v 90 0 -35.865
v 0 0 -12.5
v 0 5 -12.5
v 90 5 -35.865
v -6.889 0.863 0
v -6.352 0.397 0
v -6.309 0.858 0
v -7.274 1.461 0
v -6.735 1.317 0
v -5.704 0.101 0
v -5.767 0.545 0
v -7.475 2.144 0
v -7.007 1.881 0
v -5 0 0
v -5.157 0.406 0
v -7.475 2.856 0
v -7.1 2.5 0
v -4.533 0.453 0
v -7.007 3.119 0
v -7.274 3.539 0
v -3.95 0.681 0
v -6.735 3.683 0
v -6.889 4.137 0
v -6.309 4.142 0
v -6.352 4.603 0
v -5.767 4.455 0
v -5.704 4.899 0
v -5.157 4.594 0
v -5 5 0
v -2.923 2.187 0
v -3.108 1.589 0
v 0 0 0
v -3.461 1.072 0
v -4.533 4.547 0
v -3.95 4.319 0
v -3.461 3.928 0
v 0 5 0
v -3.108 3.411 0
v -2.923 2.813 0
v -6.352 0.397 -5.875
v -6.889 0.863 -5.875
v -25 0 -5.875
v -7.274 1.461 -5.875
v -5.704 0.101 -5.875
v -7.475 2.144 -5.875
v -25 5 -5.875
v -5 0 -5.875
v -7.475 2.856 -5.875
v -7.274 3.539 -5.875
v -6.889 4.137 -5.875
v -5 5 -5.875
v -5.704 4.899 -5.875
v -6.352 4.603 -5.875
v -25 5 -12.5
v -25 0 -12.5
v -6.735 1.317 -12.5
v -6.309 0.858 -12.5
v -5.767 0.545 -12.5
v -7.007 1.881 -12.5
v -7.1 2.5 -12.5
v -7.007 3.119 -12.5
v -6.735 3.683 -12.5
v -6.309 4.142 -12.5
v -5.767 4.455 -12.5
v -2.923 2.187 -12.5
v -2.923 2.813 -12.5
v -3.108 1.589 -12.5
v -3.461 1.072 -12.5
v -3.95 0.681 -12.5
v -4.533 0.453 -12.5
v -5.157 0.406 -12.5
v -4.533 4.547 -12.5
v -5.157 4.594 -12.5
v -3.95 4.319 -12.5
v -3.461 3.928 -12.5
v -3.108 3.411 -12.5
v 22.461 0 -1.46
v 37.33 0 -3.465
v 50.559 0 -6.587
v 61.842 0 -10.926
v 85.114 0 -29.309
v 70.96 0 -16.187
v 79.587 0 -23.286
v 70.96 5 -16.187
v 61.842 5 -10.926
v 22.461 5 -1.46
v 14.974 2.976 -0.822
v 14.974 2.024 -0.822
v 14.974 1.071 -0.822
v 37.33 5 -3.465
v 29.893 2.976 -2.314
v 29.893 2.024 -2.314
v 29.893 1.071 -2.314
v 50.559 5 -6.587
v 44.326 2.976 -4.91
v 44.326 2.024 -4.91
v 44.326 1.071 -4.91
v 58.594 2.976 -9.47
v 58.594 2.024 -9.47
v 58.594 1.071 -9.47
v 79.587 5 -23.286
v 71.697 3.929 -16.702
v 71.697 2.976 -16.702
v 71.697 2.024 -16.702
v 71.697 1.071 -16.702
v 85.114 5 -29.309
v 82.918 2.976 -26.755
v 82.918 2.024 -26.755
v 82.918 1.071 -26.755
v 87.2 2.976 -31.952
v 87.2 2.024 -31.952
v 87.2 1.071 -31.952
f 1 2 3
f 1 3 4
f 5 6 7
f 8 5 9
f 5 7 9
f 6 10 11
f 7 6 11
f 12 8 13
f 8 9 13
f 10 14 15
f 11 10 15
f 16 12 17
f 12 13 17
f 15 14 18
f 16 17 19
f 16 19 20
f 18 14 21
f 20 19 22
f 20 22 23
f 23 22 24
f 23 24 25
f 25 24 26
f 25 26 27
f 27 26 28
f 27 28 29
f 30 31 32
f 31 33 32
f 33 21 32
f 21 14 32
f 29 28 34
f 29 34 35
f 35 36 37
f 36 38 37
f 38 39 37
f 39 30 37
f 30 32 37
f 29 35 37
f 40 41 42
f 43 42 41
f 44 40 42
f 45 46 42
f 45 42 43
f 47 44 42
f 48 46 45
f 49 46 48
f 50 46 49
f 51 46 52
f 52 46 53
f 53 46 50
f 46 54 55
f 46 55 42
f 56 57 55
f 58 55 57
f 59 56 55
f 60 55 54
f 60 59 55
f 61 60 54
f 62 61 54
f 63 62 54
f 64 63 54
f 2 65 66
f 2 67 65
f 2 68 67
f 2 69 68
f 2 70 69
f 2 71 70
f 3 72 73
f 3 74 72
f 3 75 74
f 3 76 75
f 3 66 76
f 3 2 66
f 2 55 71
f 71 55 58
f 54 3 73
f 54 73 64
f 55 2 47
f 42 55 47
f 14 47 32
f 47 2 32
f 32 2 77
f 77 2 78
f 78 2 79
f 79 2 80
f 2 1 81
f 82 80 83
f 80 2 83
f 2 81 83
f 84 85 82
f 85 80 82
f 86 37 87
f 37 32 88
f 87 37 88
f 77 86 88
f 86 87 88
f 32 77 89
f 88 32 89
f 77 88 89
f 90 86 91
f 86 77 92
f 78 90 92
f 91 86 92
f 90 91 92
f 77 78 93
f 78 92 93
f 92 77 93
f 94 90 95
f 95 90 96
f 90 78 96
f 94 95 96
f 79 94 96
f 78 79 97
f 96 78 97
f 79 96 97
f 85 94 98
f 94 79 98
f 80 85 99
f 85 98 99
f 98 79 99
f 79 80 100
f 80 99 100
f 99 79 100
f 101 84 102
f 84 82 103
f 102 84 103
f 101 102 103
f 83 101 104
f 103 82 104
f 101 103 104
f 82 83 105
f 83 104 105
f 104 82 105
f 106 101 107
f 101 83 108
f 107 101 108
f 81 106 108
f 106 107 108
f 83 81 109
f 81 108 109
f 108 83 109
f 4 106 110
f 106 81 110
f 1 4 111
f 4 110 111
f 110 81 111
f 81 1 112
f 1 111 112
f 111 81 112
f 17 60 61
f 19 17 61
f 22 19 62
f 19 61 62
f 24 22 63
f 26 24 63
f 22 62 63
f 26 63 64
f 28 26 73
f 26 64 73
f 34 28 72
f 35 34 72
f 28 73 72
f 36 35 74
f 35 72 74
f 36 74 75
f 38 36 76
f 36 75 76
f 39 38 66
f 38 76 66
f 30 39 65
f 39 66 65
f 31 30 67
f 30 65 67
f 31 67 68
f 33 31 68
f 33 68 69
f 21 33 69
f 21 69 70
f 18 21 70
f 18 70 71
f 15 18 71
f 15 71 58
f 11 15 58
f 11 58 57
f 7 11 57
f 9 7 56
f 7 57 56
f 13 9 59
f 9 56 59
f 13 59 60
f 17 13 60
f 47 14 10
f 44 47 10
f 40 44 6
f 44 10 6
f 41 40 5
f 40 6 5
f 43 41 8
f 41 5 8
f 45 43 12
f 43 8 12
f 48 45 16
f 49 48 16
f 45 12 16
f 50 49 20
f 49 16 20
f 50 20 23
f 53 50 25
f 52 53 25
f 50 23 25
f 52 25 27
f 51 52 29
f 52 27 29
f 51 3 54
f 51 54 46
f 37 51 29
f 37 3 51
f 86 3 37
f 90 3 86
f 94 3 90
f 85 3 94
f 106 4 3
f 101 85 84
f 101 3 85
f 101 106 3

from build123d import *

# Parameters (mm, degrees)
SALIENTE_EXTRUIR1_DEPTH = 5
CROQUIS3_W              = 12.5
CROQUIS3_H              = 5
SALIENTE_EXTRUIR2_DEPTH = 25
CROQUIS4_R              = 2.1
CORTAR_EXTRUIR3_DEPTH   = 12.5
CORTAR_EXTRUIR2_DEPTH   = 5.875


with BuildPart() as part:
    # Croquis2 → Saliente-Extruir1 (new body)
    with BuildSketch(Plane(origin=(0, 0, 0), x_dir=(1, 0, 0), z_dir=(0, 1, 0))):
        with BuildLine():
            Line((0, 0), (0, 12.5))
            Line((0, 12.5), (90, 35.865427318))
            add(Edge.make_bspline(
                [(0, 0), (0.394136999, 0.015797336), (1.194952966, 0.048834045), (2.992448828, 0.125211317), (4.579856068, 0.200911656), (6.612637351, 0.301249971), (8.392251736, 0.398752477), (10.315878033, 0.509903005), (12.159048858, 0.626310038), (14.511736704, 0.785189542), (17.305717547, 0.994336582), (20.114398042, 1.2314722), (22.909905137, 1.499776667), (25.707540494, 1.796493489), (29.430521004, 2.232380684), (34.457318955, 2.928516321), (39.917638309, 3.8880509), (45.326966885, 5.105084916), (49.769918493, 6.319079443), (53.346159155, 7.448006204), (56.870231766, 8.730995456), (60.329622828, 10.180098556), (63.710264837, 11.804910517), (66.997597592, 13.611491814), (70.17732587, 15.601579919), (72.854283587, 17.500893709), (75.067204078, 19.237089159), (76.854732505, 20.752585132), (78.250168573, 22.004629224), (79.619707974, 23.303249768), (80.962355597, 24.647453618), (82.277321506, 26.036087115), (83.403178931, 27.288894321), (84.345387571, 28.382707102), (85.115533062, 29.306902867), (85.722715368, 30.053623655), (86.321025458, 30.807421985), (86.910712224, 31.56828047), (87.491255325, 32.335040025), (88.06431213, 33.109755161), (88.629936117, 33.892108149), (89.099903233, 34.555740193), (89.55695597, 35.215829282), (89.829292977, 35.613909175), (89.943246974, 35.781569234), (90, 35.865427318)],
                knots=[0.074822974, 0.074822974, 0.074822974, 0.074822974, 0.074822974, 0.090398408, 0.105973841, 0.121549274, 0.137124708, 0.152700141, 0.168275574, 0.183851007, 0.199426441, 0.230577307, 0.261728173, 0.277303606, 0.29287904, 0.324029906, 0.386331636, 0.445924571, 0.477075434, 0.508226306, 0.539377159, 0.57052801, 0.601678868, 0.632829681, 0.663980451, 0.695131352, 0.726282194, 0.741857688, 0.757433182, 0.773008671, 0.788584161, 0.804576906, 0.820569651, 0.836562506, 0.844558934, 0.852555362, 0.860551891, 0.86854842, 0.87654495, 0.884541479, 0.89253801, 0.900534541, 0.908531072, 0.912529338, 0.916527603, 0.916527603, 0.916527603, 0.916527603, 0.916527603], degree=4))
        make_face()
    extrude(amount=SALIENTE_EXTRUIR1_DEPTH)

    # Croquis3 → Saliente-Extruir2 (add)
    with BuildSketch(Plane.ZY):
        with Locations((-6.25, 2.5)):
            Rectangle(CROQUIS3_W, CROQUIS3_H)
    extrude(amount=SALIENTE_EXTRUIR2_DEPTH)

    # Croquis4 → Cortar-Extruir3 (cut)
    with BuildSketch(Plane(origin=(0, 0, -12.5), x_dir=(-1, 0, 0), z_dir=(0, 0, -1))):
        with Locations((5, 2.5)):
            Circle(CROQUIS4_R)
    extrude(amount=-CORTAR_EXTRUIR3_DEPTH, mode=Mode.SUBTRACT)

    # Croquis5 → Cortar-Extruir2 (cut)
    with BuildSketch(Plane.XY):
        with BuildLine():
            Line((-16, 5), (-25, 5))
            Line((-25, 5), (-25, 0))
            Line((-25, 0), (-5, 0))
            ThreePointArc((-5, 0), (-7.5, 2.5), (-5, 5))
            Line((-5, 5), (-16, 5))
        make_face()
    extrude(amount=-CORTAR_EXTRUIR2_DEPTH, mode=Mode.SUBTRACT)


solid = part.part
